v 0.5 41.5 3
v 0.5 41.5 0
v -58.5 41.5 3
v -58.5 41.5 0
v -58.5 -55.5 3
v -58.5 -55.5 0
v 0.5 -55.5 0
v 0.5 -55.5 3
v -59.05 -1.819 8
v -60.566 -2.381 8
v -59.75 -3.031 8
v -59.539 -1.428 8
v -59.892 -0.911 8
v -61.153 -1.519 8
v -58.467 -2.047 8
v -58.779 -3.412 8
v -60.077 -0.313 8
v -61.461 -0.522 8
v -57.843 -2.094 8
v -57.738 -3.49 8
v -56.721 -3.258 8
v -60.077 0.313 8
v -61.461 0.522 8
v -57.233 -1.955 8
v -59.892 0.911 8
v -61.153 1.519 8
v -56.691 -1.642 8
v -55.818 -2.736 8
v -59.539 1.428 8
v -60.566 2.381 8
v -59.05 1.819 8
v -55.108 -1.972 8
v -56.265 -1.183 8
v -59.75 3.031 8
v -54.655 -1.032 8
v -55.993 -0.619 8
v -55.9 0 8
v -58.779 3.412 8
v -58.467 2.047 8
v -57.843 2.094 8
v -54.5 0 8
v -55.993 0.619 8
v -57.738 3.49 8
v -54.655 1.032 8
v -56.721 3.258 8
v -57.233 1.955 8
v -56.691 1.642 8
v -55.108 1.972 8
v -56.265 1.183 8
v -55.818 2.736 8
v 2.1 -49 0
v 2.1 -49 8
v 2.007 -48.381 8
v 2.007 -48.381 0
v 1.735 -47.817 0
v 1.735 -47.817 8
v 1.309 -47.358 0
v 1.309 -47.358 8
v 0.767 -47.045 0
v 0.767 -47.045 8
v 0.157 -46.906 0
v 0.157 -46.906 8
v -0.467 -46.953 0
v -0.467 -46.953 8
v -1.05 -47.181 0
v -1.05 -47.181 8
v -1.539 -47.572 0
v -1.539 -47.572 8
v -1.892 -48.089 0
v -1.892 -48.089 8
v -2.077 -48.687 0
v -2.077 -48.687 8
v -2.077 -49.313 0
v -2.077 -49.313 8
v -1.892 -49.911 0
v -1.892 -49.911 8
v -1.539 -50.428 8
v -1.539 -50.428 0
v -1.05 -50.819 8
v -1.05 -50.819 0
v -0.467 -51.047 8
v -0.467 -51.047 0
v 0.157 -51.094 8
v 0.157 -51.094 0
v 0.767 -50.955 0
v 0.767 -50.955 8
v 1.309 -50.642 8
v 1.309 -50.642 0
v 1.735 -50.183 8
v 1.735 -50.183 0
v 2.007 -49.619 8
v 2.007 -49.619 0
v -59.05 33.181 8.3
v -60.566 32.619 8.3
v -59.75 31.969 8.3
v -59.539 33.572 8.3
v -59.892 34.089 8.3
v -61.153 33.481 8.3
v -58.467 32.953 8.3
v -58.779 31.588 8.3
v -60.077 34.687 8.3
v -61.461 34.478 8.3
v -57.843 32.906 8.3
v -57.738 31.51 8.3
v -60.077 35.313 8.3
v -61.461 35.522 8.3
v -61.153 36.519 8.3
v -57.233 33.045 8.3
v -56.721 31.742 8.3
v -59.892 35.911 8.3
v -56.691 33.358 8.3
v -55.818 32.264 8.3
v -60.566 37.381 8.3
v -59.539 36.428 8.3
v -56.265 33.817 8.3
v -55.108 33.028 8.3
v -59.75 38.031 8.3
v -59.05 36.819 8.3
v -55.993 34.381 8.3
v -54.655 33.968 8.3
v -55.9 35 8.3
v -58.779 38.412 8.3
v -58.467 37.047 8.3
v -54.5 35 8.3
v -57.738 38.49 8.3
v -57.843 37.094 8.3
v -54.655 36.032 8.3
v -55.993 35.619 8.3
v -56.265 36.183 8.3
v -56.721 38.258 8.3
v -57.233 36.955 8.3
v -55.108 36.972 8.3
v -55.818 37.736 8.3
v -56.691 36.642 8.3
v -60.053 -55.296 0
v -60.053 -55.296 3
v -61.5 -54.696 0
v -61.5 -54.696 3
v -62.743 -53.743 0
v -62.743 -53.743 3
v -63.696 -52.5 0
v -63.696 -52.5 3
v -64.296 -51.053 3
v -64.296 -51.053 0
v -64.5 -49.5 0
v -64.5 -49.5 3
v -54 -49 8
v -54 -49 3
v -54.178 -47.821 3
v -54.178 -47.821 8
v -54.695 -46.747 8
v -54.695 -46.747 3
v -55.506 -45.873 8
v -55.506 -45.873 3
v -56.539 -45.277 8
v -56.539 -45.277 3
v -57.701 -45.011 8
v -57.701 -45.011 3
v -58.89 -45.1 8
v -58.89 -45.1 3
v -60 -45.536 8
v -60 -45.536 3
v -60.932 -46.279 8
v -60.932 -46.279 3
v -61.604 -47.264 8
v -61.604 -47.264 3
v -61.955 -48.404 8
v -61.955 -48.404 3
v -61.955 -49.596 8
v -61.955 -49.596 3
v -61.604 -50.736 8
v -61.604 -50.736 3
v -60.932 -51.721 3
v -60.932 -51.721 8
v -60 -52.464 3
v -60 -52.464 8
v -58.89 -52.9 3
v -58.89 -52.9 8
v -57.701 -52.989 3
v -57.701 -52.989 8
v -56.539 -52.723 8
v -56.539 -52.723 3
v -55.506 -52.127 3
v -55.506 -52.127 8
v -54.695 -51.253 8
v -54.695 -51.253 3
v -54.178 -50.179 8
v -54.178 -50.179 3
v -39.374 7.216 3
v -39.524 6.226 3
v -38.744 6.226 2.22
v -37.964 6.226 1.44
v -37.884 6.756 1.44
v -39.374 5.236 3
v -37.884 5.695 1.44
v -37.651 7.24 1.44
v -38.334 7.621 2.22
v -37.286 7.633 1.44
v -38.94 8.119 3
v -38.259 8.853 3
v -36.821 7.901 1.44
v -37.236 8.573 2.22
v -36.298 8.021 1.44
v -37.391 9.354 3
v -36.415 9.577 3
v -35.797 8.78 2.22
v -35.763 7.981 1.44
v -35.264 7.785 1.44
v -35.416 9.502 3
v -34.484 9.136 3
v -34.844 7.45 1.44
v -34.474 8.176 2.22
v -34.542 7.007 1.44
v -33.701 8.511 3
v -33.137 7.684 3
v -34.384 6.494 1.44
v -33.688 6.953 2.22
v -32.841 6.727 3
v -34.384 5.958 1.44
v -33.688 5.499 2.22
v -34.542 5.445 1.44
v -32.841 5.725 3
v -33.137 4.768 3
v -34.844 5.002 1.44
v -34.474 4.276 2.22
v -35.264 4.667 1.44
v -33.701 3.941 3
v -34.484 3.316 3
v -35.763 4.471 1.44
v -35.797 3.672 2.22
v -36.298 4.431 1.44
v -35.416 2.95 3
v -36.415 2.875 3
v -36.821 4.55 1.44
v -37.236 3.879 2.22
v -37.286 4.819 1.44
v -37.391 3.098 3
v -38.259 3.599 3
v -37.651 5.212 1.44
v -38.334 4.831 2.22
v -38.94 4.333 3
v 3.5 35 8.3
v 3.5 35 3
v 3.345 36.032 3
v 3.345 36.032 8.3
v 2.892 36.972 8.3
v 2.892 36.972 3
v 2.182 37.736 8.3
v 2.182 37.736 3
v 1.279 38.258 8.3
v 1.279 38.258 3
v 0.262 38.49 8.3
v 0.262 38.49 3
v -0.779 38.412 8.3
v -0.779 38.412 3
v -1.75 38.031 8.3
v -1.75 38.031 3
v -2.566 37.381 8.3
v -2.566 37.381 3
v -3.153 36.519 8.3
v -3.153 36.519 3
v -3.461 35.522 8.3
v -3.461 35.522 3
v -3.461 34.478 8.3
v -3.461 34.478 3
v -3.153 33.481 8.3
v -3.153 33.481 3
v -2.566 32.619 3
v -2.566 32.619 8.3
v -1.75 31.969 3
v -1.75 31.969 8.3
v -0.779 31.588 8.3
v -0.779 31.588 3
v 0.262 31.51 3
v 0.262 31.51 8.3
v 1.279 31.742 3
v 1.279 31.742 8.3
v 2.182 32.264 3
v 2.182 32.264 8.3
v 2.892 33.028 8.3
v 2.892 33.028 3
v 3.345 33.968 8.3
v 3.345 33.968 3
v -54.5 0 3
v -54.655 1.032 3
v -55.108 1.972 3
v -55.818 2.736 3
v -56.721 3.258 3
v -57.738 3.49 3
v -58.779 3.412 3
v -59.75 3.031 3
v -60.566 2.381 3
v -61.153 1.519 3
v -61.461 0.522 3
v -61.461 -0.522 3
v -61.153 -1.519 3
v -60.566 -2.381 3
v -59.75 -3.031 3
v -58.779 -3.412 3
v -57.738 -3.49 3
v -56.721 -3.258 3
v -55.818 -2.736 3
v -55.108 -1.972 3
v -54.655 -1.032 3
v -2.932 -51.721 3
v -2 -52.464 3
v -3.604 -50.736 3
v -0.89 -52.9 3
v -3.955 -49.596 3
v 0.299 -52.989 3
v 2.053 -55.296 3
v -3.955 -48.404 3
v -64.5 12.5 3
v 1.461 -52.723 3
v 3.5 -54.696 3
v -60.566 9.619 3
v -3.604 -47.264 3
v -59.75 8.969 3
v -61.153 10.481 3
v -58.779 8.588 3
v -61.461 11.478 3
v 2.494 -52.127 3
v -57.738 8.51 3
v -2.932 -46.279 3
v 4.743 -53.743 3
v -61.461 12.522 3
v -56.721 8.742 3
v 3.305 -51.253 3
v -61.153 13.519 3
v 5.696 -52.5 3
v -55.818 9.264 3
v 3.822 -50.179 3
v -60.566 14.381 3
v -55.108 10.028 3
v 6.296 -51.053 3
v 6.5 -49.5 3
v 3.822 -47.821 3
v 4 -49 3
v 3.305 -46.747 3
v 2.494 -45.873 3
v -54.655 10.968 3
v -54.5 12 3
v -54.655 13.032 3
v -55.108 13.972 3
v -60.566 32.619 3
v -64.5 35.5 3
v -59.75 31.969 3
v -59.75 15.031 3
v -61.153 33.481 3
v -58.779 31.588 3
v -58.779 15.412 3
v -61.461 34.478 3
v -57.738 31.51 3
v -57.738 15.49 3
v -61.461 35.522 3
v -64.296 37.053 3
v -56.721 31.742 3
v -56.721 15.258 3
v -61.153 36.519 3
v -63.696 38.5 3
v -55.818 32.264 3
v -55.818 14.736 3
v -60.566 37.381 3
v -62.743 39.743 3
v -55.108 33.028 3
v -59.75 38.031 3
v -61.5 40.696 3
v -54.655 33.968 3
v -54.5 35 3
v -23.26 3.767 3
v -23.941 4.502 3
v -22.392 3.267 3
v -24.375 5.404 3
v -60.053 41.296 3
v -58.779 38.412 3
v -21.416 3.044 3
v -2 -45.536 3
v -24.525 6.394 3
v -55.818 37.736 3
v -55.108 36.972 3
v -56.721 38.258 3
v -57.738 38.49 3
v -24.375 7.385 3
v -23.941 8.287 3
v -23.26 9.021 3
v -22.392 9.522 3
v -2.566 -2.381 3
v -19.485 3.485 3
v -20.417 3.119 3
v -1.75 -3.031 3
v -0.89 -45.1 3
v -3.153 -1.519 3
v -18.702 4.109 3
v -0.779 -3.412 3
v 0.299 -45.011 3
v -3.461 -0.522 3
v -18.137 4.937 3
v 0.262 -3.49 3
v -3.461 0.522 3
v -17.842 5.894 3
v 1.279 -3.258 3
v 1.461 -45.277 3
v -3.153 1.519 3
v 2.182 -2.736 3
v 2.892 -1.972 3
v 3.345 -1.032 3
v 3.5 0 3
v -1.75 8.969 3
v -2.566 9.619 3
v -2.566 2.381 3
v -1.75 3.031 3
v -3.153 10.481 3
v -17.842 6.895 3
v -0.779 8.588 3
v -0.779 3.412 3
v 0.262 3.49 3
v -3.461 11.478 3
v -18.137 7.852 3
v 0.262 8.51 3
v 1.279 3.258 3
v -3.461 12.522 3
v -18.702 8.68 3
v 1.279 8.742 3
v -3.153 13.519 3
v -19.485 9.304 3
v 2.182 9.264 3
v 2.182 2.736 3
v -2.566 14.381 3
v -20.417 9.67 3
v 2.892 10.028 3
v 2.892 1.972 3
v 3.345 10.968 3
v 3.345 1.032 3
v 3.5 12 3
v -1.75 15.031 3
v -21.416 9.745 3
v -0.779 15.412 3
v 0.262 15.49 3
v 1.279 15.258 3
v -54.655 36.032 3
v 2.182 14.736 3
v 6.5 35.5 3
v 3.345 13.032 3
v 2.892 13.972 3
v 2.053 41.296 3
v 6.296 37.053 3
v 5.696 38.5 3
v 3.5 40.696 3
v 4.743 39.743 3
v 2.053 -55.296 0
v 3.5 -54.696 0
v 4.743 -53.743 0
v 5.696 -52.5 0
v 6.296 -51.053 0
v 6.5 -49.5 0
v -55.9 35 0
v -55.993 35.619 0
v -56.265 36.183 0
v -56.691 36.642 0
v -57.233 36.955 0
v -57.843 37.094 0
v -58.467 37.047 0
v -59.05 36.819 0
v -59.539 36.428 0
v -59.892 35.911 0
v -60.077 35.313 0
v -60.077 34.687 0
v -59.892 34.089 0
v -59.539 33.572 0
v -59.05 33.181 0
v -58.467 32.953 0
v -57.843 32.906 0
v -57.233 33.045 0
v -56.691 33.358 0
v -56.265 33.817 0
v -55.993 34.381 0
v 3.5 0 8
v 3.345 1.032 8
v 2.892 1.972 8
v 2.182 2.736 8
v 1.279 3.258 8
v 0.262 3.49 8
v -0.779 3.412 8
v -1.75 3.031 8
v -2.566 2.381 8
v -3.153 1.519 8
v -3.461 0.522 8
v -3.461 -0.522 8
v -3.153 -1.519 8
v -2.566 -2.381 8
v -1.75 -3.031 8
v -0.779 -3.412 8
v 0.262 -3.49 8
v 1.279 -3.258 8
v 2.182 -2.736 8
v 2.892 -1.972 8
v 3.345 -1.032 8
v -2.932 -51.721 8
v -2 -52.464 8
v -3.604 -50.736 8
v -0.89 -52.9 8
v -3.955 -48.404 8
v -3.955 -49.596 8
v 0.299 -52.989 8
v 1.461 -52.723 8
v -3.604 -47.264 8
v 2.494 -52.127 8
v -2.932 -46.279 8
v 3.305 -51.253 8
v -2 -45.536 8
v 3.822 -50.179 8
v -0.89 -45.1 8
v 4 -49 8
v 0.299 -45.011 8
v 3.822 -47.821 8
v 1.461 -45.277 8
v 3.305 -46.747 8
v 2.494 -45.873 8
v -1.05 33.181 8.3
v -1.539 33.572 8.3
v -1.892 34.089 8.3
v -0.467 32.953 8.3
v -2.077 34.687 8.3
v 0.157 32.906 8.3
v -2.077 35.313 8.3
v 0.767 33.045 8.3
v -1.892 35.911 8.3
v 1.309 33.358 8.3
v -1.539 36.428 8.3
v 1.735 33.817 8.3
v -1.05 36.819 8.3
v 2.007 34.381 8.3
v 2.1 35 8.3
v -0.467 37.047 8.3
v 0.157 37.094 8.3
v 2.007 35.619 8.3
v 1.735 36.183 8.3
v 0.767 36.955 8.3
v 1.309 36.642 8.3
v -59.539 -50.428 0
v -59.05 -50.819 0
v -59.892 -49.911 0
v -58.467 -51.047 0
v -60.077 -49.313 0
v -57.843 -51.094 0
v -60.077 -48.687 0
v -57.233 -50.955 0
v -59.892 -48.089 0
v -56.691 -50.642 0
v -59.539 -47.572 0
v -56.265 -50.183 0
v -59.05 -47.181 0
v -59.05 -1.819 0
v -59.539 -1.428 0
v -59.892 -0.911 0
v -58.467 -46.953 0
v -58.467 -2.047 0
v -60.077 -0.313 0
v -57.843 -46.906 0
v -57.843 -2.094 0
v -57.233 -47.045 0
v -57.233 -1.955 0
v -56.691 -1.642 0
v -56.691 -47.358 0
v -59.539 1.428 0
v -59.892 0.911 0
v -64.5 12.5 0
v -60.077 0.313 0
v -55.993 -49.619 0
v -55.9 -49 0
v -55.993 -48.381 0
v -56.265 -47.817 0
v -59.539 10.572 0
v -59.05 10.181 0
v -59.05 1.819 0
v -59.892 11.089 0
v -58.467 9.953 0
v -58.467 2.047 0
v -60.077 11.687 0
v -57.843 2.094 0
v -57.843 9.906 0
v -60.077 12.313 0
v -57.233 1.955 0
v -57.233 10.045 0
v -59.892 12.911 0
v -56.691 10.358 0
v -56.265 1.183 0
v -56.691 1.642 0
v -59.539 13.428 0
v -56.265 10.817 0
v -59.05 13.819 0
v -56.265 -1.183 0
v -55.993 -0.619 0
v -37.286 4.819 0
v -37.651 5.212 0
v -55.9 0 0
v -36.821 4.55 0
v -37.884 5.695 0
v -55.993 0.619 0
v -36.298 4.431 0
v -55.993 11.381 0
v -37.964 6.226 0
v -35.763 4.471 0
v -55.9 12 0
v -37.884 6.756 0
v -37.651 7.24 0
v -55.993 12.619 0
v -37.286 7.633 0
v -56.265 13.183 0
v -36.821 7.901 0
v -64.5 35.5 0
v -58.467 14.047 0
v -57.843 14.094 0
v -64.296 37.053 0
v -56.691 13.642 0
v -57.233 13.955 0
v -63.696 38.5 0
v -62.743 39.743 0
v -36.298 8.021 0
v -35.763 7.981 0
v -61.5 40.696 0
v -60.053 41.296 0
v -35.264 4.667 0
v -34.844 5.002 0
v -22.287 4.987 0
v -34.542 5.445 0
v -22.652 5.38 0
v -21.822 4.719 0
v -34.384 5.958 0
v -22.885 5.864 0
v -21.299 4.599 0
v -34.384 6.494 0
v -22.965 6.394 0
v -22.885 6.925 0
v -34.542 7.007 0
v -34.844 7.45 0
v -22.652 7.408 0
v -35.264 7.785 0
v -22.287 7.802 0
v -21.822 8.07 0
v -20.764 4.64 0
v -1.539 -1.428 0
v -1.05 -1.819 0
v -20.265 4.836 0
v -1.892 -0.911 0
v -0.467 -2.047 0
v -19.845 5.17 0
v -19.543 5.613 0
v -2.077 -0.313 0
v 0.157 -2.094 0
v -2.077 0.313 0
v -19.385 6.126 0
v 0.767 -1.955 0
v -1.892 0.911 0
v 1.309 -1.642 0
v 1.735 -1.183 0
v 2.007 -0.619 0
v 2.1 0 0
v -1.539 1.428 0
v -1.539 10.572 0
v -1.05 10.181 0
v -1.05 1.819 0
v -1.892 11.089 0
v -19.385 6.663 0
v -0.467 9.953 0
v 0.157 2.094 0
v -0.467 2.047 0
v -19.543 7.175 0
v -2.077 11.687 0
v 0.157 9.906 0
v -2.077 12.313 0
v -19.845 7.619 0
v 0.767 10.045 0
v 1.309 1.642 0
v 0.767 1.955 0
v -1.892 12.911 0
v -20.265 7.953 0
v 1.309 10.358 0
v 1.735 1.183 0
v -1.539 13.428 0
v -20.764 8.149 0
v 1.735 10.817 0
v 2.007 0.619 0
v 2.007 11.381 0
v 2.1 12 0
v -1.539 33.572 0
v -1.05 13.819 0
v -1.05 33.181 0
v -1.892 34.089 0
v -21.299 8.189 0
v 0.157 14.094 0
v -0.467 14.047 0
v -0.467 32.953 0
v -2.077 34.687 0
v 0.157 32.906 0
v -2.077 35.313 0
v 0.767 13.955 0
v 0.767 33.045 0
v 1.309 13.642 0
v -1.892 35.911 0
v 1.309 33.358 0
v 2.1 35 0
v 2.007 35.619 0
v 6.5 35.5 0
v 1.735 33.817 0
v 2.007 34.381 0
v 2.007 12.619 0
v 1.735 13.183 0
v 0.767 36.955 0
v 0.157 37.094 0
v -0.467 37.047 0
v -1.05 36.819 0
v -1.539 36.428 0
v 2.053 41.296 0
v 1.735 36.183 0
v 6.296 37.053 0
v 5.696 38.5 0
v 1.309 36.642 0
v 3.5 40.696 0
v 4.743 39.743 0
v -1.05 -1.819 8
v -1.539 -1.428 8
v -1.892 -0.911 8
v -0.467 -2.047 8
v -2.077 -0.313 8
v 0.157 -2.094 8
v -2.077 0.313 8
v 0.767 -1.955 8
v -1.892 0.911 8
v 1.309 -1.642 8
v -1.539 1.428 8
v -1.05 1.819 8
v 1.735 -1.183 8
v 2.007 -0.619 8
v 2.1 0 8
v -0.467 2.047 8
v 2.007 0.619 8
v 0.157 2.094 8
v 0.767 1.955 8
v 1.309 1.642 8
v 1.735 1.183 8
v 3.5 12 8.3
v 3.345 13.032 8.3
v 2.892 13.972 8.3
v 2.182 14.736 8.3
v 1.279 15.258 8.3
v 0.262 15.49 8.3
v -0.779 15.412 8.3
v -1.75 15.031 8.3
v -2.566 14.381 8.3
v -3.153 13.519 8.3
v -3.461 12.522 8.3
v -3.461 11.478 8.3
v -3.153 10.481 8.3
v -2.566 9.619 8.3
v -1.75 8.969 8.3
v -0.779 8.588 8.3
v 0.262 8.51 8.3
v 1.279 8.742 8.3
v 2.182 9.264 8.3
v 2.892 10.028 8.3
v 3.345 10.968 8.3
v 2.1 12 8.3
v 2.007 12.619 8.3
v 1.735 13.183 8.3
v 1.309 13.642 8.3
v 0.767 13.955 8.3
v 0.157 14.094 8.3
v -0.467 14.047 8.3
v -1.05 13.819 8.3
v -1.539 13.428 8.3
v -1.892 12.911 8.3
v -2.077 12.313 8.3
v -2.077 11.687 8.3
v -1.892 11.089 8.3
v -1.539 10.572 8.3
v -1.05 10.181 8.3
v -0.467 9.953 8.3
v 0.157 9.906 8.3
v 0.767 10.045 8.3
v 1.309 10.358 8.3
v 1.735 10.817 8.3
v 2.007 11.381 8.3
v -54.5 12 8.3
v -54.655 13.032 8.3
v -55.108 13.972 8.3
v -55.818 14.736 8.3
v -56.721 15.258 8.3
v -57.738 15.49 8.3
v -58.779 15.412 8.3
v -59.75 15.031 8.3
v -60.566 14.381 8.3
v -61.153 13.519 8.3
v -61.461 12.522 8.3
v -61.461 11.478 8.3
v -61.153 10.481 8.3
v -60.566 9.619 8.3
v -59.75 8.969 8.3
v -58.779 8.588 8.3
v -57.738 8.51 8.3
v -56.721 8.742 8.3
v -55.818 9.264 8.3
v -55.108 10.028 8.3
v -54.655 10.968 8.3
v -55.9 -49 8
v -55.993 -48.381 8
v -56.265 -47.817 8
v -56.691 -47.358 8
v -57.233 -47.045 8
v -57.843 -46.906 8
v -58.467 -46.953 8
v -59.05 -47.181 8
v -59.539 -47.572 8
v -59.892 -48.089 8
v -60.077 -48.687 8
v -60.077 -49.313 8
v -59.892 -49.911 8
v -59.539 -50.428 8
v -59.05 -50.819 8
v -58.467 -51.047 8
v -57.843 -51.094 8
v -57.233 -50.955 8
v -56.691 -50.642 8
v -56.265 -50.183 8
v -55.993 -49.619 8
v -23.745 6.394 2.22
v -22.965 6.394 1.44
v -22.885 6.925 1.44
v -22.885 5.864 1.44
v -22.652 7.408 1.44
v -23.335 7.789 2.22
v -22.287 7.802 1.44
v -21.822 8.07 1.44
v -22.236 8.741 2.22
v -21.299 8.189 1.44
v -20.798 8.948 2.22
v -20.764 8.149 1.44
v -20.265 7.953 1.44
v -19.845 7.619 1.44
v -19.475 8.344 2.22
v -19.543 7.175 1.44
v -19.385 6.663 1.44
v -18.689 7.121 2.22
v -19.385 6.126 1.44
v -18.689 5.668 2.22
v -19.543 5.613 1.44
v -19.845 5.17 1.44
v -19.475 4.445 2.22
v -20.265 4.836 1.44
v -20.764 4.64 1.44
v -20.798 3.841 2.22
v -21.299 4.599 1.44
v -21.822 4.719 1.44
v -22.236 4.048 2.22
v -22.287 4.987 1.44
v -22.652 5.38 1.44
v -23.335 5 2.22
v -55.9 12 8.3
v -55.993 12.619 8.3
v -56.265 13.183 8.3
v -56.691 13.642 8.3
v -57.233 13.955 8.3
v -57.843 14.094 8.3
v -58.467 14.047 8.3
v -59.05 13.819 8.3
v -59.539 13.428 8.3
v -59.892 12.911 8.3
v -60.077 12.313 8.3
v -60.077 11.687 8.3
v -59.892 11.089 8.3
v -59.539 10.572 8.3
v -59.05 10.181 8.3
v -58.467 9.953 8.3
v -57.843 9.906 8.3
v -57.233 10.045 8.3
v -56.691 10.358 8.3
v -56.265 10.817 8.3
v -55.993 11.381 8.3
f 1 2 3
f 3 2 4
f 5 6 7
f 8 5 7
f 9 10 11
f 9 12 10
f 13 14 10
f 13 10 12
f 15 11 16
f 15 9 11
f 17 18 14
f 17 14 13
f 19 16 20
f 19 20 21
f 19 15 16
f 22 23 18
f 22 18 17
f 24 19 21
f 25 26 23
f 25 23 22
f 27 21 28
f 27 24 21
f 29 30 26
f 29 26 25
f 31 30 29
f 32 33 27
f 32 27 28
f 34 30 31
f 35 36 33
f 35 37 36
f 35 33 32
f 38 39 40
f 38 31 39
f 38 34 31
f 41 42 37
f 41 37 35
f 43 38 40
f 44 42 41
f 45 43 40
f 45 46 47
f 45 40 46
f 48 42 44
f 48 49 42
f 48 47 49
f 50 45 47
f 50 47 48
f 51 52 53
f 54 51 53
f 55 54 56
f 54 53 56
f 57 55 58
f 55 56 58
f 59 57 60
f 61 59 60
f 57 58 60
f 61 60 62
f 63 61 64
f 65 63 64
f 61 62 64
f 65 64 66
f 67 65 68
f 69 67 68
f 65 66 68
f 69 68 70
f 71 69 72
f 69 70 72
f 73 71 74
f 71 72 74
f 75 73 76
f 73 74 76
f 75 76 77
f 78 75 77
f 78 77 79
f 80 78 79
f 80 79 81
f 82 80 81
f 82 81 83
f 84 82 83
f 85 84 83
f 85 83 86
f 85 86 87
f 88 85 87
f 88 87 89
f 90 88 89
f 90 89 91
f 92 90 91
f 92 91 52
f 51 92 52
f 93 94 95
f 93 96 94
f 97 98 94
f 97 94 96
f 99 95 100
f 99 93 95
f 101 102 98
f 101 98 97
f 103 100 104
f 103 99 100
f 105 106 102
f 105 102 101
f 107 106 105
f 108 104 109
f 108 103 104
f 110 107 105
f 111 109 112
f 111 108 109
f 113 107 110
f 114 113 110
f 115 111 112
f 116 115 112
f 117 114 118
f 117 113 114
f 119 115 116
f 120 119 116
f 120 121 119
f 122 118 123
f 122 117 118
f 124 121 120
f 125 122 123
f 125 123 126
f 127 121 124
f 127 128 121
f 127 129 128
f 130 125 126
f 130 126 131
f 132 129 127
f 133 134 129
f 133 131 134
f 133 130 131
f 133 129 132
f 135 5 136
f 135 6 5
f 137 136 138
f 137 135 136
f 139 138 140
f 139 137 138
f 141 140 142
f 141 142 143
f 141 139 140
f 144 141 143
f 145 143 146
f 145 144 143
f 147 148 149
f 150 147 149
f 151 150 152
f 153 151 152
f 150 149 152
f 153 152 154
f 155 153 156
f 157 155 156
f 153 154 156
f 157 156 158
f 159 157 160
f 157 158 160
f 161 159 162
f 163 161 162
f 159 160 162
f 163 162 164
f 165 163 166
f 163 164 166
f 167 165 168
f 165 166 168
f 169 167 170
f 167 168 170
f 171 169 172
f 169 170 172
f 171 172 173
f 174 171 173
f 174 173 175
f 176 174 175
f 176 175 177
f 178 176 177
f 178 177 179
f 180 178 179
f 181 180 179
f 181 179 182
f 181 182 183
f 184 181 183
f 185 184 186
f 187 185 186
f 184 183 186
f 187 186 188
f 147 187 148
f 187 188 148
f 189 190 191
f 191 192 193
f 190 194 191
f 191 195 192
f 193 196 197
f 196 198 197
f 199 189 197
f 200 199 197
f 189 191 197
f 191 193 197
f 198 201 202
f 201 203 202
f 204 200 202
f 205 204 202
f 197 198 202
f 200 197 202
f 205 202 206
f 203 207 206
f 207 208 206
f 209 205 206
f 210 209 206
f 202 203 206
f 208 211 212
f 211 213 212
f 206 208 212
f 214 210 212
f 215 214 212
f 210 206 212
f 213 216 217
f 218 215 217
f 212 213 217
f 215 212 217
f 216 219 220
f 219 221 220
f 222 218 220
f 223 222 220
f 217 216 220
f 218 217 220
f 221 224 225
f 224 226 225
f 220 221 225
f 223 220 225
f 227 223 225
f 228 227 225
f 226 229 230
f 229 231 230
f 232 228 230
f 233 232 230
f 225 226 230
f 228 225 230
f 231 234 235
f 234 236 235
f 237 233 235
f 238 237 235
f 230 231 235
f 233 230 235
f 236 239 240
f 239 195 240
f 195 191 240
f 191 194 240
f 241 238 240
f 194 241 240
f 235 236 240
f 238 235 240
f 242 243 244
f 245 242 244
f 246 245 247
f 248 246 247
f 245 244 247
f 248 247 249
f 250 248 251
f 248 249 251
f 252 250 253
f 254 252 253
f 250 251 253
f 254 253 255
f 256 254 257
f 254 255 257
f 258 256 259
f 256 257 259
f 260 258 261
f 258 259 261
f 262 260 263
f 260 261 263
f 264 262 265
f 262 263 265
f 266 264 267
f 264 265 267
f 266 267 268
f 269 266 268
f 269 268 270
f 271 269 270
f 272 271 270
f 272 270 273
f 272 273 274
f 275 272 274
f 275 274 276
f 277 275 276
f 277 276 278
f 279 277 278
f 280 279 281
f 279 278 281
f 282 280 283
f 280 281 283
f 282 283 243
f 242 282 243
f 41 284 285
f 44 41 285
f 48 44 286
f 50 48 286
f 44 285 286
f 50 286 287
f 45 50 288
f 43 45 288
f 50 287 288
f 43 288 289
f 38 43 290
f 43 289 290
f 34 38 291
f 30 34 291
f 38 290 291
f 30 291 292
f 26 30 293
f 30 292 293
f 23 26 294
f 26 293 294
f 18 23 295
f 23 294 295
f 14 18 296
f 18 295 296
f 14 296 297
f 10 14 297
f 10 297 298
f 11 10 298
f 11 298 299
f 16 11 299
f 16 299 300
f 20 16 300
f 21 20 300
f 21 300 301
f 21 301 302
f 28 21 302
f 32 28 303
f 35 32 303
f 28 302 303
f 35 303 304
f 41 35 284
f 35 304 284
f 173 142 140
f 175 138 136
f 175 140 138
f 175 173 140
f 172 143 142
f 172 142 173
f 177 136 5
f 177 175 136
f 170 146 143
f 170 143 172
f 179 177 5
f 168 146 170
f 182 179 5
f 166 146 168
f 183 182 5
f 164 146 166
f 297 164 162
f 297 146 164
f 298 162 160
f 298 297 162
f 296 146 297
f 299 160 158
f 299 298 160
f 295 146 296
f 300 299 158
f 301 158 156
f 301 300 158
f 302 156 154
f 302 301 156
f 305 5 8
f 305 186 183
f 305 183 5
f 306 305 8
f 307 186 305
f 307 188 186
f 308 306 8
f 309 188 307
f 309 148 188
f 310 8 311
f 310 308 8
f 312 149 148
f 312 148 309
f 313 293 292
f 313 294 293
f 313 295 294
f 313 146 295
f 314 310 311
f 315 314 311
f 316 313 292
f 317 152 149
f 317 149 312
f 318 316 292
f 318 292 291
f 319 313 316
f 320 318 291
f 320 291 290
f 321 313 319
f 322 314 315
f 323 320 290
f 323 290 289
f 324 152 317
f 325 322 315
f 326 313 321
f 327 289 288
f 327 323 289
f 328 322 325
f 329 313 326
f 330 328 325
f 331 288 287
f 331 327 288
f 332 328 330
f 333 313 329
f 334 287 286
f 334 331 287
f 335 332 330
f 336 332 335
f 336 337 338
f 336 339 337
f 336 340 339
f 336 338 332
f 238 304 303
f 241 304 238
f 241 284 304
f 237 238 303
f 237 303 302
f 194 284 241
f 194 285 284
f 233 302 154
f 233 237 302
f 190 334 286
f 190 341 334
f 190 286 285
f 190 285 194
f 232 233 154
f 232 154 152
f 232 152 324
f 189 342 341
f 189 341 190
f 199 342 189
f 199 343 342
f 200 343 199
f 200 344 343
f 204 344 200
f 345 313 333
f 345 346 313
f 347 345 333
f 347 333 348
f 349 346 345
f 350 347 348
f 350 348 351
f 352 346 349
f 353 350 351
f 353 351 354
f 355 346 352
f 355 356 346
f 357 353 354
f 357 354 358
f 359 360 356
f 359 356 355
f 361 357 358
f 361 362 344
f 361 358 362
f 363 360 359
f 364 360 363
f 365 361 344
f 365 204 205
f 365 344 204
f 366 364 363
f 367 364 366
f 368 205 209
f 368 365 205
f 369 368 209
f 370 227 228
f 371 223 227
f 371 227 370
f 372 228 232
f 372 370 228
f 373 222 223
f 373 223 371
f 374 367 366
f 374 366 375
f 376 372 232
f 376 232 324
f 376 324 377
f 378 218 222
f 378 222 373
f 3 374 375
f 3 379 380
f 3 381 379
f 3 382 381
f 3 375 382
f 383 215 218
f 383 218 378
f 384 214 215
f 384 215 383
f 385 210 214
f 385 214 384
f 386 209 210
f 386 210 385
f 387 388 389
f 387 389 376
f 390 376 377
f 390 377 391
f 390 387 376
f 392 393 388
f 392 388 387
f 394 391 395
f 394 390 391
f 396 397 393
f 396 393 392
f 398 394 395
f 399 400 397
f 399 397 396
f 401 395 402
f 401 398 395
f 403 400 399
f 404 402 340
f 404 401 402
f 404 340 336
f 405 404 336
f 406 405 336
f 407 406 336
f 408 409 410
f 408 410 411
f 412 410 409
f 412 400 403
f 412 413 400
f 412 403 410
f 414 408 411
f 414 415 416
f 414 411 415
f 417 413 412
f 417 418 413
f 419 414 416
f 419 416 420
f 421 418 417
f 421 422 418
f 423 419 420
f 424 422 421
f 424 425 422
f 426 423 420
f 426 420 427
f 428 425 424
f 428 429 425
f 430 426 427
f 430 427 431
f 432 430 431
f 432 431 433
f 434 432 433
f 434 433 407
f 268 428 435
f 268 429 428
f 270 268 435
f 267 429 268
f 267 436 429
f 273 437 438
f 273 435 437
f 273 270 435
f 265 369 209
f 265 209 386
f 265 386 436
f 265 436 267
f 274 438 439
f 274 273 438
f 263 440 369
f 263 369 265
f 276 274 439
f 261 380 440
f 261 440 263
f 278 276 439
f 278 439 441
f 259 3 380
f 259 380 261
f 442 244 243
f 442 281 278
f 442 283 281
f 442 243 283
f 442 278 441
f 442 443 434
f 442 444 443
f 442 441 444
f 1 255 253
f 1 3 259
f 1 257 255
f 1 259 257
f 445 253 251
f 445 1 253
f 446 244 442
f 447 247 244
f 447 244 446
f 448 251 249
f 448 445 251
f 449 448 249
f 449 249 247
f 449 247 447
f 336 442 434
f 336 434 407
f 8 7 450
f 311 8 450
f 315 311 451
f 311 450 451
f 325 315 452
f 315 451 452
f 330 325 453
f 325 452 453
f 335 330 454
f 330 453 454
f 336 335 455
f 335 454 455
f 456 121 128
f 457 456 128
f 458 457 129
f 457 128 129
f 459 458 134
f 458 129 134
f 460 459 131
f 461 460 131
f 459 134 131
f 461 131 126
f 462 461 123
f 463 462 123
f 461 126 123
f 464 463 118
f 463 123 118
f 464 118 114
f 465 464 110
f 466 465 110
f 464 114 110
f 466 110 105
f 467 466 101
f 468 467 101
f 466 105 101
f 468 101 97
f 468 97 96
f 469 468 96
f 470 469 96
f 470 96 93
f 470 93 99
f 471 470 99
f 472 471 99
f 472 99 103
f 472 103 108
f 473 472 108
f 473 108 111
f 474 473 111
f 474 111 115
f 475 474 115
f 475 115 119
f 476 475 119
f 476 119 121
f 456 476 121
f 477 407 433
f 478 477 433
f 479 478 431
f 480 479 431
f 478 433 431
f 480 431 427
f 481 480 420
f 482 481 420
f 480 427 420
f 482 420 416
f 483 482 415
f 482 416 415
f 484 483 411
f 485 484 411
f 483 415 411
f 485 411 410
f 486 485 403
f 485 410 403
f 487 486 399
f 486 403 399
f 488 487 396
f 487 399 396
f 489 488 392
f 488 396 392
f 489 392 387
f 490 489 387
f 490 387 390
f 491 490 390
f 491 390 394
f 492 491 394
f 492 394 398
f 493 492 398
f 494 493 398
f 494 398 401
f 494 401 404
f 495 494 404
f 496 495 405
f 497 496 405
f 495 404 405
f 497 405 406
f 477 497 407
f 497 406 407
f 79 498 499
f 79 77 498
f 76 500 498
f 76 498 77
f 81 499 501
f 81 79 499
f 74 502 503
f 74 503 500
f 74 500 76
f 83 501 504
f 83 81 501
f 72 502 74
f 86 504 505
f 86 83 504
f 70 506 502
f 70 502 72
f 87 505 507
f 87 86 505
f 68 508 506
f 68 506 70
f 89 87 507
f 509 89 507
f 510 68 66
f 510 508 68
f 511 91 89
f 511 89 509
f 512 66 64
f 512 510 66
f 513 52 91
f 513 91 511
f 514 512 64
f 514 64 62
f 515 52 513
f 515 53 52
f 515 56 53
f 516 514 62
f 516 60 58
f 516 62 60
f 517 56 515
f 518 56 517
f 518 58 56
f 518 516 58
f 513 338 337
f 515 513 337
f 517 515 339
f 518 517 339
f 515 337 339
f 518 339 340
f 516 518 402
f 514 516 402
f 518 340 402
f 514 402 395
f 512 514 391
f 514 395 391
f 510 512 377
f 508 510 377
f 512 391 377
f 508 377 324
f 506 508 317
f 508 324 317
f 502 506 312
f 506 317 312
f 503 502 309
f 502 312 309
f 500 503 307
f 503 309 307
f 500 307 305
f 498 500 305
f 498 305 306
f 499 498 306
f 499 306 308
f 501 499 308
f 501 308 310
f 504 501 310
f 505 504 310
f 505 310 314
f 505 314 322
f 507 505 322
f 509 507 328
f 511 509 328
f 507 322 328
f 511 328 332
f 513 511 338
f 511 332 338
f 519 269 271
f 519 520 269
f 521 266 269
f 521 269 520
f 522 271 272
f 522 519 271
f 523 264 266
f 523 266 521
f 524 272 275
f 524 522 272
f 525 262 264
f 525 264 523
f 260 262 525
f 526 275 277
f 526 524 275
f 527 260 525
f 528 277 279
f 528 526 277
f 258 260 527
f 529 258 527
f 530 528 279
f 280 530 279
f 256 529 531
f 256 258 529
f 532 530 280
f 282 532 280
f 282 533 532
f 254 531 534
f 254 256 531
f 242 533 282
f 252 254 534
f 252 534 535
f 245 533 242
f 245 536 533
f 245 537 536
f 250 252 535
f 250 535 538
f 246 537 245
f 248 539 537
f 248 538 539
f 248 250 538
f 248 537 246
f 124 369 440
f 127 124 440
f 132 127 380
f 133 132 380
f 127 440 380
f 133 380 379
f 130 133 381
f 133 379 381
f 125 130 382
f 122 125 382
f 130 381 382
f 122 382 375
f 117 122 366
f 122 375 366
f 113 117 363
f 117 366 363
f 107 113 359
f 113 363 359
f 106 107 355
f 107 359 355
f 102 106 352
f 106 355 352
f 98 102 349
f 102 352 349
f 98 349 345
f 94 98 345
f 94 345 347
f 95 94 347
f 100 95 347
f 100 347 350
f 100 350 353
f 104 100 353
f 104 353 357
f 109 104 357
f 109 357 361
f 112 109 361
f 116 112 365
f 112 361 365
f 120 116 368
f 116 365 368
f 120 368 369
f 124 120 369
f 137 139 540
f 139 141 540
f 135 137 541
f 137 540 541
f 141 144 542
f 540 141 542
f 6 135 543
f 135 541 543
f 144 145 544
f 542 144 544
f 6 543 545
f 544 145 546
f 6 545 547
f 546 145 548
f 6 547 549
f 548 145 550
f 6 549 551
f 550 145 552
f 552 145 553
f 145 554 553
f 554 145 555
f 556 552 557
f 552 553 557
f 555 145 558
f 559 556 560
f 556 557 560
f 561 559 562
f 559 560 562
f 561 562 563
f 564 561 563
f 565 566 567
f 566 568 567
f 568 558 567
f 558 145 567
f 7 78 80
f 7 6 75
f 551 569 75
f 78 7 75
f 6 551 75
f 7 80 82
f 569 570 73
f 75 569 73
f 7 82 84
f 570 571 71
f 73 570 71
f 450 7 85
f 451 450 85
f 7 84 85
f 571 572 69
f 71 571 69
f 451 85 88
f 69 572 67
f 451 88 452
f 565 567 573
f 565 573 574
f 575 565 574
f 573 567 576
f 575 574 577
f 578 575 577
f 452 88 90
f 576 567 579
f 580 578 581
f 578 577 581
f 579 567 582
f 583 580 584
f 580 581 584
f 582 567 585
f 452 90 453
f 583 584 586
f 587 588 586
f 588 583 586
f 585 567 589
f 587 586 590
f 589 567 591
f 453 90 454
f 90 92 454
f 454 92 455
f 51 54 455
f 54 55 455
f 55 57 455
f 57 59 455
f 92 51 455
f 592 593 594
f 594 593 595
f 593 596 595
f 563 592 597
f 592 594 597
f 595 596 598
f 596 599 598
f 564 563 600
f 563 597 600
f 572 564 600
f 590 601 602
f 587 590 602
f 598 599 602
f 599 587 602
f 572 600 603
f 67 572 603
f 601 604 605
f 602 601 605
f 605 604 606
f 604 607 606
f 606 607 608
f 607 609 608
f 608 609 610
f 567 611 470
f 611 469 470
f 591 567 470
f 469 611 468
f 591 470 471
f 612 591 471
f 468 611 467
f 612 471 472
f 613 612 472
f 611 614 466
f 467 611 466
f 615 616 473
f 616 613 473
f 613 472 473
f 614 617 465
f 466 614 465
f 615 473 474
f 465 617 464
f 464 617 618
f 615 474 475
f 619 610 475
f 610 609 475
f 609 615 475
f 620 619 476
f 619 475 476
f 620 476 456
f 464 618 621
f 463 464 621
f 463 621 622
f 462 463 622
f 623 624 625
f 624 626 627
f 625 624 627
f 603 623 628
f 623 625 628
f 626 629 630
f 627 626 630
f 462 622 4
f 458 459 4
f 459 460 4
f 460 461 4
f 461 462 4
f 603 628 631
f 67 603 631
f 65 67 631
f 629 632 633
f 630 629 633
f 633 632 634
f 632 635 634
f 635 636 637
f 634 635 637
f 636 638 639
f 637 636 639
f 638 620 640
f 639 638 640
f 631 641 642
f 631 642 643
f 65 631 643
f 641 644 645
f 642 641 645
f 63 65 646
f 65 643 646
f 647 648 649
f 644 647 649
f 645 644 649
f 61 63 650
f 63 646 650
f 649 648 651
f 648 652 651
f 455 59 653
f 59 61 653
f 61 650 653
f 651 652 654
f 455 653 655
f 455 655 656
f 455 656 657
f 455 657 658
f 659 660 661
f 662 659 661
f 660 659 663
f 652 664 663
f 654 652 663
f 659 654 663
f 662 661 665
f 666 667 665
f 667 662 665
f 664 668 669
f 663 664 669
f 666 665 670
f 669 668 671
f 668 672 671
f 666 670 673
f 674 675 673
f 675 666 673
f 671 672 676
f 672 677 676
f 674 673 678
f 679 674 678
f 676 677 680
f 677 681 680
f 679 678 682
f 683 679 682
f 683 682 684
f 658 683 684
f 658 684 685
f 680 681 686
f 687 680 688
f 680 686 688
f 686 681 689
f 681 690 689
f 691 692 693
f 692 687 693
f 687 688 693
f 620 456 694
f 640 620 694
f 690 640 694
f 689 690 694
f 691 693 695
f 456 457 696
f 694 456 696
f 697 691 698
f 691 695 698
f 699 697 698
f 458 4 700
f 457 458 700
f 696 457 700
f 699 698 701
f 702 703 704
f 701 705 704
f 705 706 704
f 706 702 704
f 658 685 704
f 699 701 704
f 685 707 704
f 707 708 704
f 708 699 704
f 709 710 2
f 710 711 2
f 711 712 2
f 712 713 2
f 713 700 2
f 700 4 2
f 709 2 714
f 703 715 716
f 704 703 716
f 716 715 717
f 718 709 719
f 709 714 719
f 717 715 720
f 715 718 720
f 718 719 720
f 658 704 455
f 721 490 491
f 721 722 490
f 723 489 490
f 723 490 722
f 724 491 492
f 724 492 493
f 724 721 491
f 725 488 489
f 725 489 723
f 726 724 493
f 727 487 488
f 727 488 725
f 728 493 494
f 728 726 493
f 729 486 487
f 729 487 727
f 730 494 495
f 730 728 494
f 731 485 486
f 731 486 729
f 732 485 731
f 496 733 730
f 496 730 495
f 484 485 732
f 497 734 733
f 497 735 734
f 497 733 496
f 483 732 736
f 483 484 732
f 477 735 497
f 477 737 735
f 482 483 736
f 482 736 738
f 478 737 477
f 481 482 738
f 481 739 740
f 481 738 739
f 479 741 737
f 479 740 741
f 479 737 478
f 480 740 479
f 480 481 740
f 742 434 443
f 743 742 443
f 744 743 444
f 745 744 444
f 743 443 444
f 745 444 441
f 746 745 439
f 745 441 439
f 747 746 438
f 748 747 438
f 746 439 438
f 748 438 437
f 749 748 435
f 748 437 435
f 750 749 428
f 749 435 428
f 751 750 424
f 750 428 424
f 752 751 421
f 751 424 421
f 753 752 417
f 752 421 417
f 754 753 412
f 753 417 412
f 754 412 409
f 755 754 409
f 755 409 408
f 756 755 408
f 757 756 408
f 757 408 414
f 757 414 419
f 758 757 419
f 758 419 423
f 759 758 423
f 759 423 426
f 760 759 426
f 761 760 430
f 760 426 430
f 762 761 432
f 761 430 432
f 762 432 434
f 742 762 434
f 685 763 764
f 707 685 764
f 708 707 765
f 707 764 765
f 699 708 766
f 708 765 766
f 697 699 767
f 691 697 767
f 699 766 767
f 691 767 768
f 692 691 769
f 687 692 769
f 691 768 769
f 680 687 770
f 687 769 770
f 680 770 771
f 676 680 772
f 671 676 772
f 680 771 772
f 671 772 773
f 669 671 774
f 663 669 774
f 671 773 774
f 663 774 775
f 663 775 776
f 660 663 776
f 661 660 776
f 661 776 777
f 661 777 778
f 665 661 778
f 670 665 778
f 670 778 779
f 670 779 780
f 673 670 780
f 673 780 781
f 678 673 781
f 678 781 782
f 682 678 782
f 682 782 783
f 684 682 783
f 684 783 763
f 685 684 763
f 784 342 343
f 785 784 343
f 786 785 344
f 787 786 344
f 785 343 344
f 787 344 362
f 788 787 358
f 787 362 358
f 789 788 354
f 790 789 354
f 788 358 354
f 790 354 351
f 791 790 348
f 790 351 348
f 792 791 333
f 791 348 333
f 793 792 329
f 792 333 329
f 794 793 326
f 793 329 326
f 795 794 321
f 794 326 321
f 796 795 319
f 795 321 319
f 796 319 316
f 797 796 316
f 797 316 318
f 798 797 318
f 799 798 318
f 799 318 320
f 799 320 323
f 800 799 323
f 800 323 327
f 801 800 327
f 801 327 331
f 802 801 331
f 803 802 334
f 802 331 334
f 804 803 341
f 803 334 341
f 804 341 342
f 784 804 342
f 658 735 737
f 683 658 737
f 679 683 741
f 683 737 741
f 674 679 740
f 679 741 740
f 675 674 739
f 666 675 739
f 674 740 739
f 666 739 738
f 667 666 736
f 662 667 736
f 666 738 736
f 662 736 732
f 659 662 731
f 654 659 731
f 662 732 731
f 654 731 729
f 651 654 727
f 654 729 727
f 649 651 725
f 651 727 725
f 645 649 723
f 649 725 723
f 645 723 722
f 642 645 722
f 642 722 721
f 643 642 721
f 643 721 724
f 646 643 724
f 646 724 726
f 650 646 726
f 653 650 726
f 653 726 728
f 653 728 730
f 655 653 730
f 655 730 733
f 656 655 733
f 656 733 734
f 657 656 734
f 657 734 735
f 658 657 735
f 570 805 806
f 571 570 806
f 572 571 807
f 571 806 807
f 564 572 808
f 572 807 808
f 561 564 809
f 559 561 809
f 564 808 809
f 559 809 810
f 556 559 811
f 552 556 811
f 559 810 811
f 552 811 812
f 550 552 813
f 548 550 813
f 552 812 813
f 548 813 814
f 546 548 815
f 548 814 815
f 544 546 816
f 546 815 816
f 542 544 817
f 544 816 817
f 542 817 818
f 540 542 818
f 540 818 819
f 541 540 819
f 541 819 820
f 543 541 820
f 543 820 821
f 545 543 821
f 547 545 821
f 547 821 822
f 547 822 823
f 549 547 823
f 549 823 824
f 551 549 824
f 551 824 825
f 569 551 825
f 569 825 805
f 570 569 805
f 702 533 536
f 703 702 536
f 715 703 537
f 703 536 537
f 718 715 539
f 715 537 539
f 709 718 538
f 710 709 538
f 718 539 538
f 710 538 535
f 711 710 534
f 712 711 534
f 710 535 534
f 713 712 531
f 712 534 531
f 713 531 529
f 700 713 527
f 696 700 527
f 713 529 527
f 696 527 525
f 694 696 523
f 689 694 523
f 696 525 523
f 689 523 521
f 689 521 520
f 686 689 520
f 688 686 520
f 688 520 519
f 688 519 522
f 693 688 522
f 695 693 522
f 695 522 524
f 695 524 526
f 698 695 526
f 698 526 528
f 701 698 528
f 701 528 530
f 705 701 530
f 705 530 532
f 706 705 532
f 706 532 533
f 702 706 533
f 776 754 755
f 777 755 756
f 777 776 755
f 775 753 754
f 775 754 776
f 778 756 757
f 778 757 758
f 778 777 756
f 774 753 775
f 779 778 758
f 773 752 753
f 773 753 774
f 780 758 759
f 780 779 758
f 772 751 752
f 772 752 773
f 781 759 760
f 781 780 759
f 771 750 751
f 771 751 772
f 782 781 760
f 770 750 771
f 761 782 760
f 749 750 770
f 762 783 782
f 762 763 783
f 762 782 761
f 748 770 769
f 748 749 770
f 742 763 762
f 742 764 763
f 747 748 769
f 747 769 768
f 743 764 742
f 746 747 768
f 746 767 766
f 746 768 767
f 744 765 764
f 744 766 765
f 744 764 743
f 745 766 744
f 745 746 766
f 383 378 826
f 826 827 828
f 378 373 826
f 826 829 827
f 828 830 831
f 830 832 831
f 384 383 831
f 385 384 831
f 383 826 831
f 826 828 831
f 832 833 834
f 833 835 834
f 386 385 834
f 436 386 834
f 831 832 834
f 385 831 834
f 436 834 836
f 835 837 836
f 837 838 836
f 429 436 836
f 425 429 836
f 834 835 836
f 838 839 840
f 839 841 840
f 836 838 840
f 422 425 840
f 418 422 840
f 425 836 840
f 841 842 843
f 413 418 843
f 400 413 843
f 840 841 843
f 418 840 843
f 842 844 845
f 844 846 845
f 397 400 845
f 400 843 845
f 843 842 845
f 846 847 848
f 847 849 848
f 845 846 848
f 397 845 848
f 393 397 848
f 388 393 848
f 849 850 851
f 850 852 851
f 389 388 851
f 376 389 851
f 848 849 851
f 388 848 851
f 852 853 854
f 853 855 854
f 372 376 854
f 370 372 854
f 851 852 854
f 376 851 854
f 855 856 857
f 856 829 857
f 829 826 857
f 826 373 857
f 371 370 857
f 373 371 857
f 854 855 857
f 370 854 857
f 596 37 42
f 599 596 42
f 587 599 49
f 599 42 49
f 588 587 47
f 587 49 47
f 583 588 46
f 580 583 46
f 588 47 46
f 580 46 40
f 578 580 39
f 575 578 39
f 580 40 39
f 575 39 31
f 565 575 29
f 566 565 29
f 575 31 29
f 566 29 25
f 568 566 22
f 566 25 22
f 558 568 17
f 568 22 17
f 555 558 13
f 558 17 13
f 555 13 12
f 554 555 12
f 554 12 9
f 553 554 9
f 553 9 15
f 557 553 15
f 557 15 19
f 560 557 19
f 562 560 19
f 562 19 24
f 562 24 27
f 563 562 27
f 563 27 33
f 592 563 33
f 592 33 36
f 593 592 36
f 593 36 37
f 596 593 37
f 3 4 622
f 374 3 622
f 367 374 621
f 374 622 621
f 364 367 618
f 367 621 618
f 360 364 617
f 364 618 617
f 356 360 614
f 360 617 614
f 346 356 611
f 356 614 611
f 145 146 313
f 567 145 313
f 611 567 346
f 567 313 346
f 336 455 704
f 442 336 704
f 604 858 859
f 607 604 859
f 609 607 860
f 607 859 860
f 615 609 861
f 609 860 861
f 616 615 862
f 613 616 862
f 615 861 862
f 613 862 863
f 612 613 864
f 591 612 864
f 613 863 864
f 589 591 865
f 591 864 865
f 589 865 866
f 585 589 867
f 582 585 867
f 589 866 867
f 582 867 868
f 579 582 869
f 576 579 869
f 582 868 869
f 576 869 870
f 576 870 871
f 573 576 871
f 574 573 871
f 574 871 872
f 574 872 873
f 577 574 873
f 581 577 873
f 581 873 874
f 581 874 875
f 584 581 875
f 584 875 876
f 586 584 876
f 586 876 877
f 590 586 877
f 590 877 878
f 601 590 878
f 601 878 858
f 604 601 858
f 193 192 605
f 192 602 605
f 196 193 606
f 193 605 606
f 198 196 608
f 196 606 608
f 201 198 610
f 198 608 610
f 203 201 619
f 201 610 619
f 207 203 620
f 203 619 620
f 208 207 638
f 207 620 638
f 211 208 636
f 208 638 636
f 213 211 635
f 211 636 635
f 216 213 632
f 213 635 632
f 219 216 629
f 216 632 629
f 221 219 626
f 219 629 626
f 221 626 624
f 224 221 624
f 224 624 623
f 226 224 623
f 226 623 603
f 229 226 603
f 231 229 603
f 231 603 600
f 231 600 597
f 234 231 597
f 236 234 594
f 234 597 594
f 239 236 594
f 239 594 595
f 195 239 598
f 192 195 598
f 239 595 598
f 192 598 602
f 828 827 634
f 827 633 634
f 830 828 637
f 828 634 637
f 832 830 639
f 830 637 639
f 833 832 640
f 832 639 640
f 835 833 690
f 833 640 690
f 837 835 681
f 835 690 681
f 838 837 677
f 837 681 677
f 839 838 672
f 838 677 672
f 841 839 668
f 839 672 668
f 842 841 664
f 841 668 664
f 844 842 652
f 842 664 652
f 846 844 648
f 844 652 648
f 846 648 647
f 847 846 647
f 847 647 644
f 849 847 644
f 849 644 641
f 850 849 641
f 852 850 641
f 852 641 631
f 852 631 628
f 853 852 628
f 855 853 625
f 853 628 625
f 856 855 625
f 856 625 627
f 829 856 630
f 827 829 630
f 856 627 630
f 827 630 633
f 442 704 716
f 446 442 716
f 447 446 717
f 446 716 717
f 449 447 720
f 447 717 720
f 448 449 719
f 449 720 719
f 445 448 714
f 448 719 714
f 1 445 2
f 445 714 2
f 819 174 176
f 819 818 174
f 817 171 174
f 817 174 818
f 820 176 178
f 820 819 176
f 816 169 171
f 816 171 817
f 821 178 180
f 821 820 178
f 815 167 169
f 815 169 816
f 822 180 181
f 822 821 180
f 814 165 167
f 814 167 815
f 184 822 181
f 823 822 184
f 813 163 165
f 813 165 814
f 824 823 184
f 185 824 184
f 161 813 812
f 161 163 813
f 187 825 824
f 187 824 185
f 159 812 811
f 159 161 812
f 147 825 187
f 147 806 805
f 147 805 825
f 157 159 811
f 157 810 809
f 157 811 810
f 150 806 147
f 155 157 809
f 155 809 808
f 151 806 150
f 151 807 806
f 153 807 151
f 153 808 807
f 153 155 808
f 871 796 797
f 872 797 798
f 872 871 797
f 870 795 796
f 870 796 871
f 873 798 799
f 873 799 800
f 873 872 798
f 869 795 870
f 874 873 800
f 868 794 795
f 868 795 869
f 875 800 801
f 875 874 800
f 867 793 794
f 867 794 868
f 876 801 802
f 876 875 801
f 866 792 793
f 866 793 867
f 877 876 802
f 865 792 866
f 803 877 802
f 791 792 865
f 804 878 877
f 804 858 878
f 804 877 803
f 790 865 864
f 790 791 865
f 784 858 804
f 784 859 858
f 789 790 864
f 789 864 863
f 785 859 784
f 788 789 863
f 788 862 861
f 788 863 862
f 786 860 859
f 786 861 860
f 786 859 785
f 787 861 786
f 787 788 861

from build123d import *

# Parameters (mm, degrees)
SKETCH1_R                                            = 1.375
BOSS_EXTRUDE1_DEPTH                                  = 3
SKETCH2_R                                            = 4
SKETCH2_R_2                                          = 1.375
SKETCH2_R_3                                          = 3.5
BOSS_EXTRUDE2_DEPTH                                  = 5
SKETCH2_3_R                                          = 3.5
SKETCH2_3_R_2                                        = 1.375
BOSS_EXTRUDE3_DEPTH                                  = 5.3
SKETCH3_R                                            = 2.1
CUT_EXTRUDE1_DEPTH                                   = 102.373468088
CSK_FOR_M3_HEX_SOCKET_COUNTERSUNK_CAP_SC_D           = 3.6
CSK_FOR_M3_HEX_SOCKET_COUNTERSUNK_CAP_SC_DEPTH       = 14.44
CSK_FOR_M3_HEX_SOCKET_COUNTERSUNK_CAP_SC_CSINK_D     = 6.72
CSK_FOR_M3_HEX_SOCKET_COUNTERSUNK_CAP_SC_CSINK_ANGLE = 90
CSK_FOR_M3_HEX_SOCKET_COUNTERSUNK_CAP_SC_TIP         = 1.081549114
SKETCH6_W                                            = 40.311227037
SKETCH6_H                                            = 68
CUT_EXTRUDE2_DEPTH                                   = 102.172031867
FILLET1_R                                            = 6


with BuildPart() as part:
    # Sketch1 → Boss-Extrude1 (new body)
    with BuildSketch(Plane.XY):
        with BuildLine():
            ThreePointArc((-78.424167346, 6.5), (-82.666808033, 4.742640687), (-84.424167346, 0.5))
            Line((-84.424167346, 0.5), (-84.424167346, -49.5))
            ThreePointArc((-84.424167346, -49.5), (-82.666808033, -53.742640687), (-78.424167346, -55.5))
            Line((-78.424167346, -55.5), (0.5, -55.5))
            ThreePointArc((0.5, -55.5), (4.742640687, -53.742640687), (6.5, -49.5))
            Line((6.5, -49.5), (6.5, 35.5))
            ThreePointArc((6.5, 35.5), (4.742640687, 39.742640687), (0.5, 41.5))
            Line((0.5, 41.5), (-58.5, 41.5))
            ThreePointArc((-58.5, 41.5), (-62.742640687, 39.742640687), (-64.5, 35.5))
            Line((-64.5, 35.5), (-64.5, 12.5))
            ThreePointArc((-64.5, 12.5), (-66.257359313, 8.257359313), (-70.5, 6.5))
            Line((-70.5, 6.5), (-78.424167346, 6.5))
        make_face()
        with Locations((-58, -49)):
            Circle(SKETCH1_R, mode=Mode.SUBTRACT)
        with Locations((0, -49)):
            Circle(SKETCH1_R, mode=Mode.SUBTRACT)
        with Locations((-58, 0)):
            Circle(SKETCH1_R, mode=Mode.SUBTRACT)
        Circle(SKETCH1_R, mode=Mode.SUBTRACT)
        with Locations((-58, 12)):
            Circle(SKETCH1_R, mode=Mode.SUBTRACT)
        with Locations((-58, 35)):
            Circle(SKETCH1_R, mode=Mode.SUBTRACT)
        with Locations((0, 12)):
            Circle(SKETCH1_R, mode=Mode.SUBTRACT)
        with Locations((0, 35)):
            Circle(SKETCH1_R, mode=Mode.SUBTRACT)
    extrude(amount=BOSS_EXTRUDE1_DEPTH)

    # Sketch2 → Boss-Extrude2 (add)
    # profile 1 of 4: a face of its own
    with BuildSketch(Plane.XY.offset(3)):
        with Locations((-58, -49)):
            Circle(SKETCH2_R)
        with Locations((-58, -49)):
            Circle(SKETCH2_R_2, mode=Mode.SUBTRACT)
    # profile 2 of 4: a face of its own
    with BuildSketch(Plane.XY.offset(3)):
        with Locations((0, -49)):
            Circle(SKETCH2_R)
        with Locations((0, -49)):
            Circle(SKETCH2_R_2, mode=Mode.SUBTRACT)
    # profile 3 of 4: a face of its own
    with BuildSketch(Plane.XY.offset(3)):
        Circle(SKETCH2_R_3)
        Circle(SKETCH2_R_2, mode=Mode.SUBTRACT)
    # profile 4 of 4: a face of its own
    with BuildSketch(Plane.XY.offset(3)):
        with Locations((-58, 0)):
            Circle(SKETCH2_R_3)
        with Locations((-58, 0)):
            Circle(SKETCH2_R_2, mode=Mode.SUBTRACT)
    extrude(amount=BOSS_EXTRUDE2_DEPTH)

    # Sketch2<3> → Boss-Extrude3 (add)
    # profile 1 of 4: a face of its own
    with BuildSketch(Plane.XY.offset(3)):
        with Locations((-58, 35)):
            Circle(SKETCH2_3_R)
        with Locations((-58, 35)):
            Circle(SKETCH2_3_R_2, mode=Mode.SUBTRACT)
    # profile 2 of 4: a face of its own
    with BuildSketch(Plane.XY.offset(3)):
        with Locations((-58, 12)):
            Circle(SKETCH2_3_R)
        with Locations((-58, 12)):
            Circle(SKETCH2_3_R_2, mode=Mode.SUBTRACT)
    # profile 3 of 4: a face of its own
    with BuildSketch(Plane.XY.offset(3)):
        with Locations((0, 35)):
            Circle(SKETCH2_3_R)
        with Locations((0, 35)):
            Circle(SKETCH2_3_R_2, mode=Mode.SUBTRACT)
    # profile 4 of 4: a face of its own
    with BuildSketch(Plane.XY.offset(3)):
        with Locations((0, 12)):
            Circle(SKETCH2_3_R)
        with Locations((0, 12)):
            Circle(SKETCH2_3_R_2, mode=Mode.SUBTRACT)
    extrude(amount=BOSS_EXTRUDE3_DEPTH)

    # Sketch3 → Cut-Extrude1 (cut, through all)
    with BuildSketch(Plane.XY.offset(8.3)):
        with Locations((-58, 35)):
            Circle(SKETCH3_R)
        with Locations((0, 35)):
            Circle(SKETCH3_R)
        with Locations((0, 12)):
            Circle(SKETCH3_R)
        with Locations((-58, 12)):
            Circle(SKETCH3_R)
        with Locations((-58, 0)):
            Circle(SKETCH3_R)
        Circle(SKETCH3_R)
        with Locations((-58, -49)):
            Circle(SKETCH3_R)
        with Locations((0, -49)):
            Circle(SKETCH3_R)
    extrude(amount=-CUT_EXTRUDE1_DEPTH, mode=Mode.SUBTRACT)

    # CSK for M3 Hex Socket Countersunk Cap Screw1
    with Locations(Plane.XY.offset(3)):
        with Locations((-36.16376606, 6.225895505), (-21.164712778, 6.394420408)):
            CounterSinkHole(CSK_FOR_M3_HEX_SOCKET_COUNTERSUNK_CAP_SC_D / 2, CSK_FOR_M3_HEX_SOCKET_COUNTERSUNK_CAP_SC_CSINK_D / 2, depth=CSK_FOR_M3_HEX_SOCKET_COUNTERSUNK_CAP_SC_DEPTH, counter_sink_angle=CSK_FOR_M3_HEX_SOCKET_COUNTERSUNK_CAP_SC_CSINK_ANGLE)
            with Locations((0, 0, -(CSK_FOR_M3_HEX_SOCKET_COUNTERSUNK_CAP_SC_DEPTH + CSK_FOR_M3_HEX_SOCKET_COUNTERSUNK_CAP_SC_TIP / 2))):  # 118° drill point
                Cone(0, CSK_FOR_M3_HEX_SOCKET_COUNTERSUNK_CAP_SC_D / 2, CSK_FOR_M3_HEX_SOCKET_COUNTERSUNK_CAP_SC_TIP, mode=Mode.SUBTRACT)

    # Sketch6 → Cut-Extrude2 (cut, through all)
    with BuildSketch(Plane.XY.offset(3)):
        with Locations((-84.655613519, -21.5)):
            Rectangle(SKETCH6_W, SKETCH6_H)
    extrude(amount=-CUT_EXTRUDE2_DEPTH, mode=Mode.SUBTRACT)

    # Fillet1
    fillet1_edges = [part.edges().sort_by_distance(p)[0] for p in [
        (-64.5, -55.5, 1.5),
    ]]
    fillet(fillet1_edges, radius=FILLET1_R)


solid = part.part
